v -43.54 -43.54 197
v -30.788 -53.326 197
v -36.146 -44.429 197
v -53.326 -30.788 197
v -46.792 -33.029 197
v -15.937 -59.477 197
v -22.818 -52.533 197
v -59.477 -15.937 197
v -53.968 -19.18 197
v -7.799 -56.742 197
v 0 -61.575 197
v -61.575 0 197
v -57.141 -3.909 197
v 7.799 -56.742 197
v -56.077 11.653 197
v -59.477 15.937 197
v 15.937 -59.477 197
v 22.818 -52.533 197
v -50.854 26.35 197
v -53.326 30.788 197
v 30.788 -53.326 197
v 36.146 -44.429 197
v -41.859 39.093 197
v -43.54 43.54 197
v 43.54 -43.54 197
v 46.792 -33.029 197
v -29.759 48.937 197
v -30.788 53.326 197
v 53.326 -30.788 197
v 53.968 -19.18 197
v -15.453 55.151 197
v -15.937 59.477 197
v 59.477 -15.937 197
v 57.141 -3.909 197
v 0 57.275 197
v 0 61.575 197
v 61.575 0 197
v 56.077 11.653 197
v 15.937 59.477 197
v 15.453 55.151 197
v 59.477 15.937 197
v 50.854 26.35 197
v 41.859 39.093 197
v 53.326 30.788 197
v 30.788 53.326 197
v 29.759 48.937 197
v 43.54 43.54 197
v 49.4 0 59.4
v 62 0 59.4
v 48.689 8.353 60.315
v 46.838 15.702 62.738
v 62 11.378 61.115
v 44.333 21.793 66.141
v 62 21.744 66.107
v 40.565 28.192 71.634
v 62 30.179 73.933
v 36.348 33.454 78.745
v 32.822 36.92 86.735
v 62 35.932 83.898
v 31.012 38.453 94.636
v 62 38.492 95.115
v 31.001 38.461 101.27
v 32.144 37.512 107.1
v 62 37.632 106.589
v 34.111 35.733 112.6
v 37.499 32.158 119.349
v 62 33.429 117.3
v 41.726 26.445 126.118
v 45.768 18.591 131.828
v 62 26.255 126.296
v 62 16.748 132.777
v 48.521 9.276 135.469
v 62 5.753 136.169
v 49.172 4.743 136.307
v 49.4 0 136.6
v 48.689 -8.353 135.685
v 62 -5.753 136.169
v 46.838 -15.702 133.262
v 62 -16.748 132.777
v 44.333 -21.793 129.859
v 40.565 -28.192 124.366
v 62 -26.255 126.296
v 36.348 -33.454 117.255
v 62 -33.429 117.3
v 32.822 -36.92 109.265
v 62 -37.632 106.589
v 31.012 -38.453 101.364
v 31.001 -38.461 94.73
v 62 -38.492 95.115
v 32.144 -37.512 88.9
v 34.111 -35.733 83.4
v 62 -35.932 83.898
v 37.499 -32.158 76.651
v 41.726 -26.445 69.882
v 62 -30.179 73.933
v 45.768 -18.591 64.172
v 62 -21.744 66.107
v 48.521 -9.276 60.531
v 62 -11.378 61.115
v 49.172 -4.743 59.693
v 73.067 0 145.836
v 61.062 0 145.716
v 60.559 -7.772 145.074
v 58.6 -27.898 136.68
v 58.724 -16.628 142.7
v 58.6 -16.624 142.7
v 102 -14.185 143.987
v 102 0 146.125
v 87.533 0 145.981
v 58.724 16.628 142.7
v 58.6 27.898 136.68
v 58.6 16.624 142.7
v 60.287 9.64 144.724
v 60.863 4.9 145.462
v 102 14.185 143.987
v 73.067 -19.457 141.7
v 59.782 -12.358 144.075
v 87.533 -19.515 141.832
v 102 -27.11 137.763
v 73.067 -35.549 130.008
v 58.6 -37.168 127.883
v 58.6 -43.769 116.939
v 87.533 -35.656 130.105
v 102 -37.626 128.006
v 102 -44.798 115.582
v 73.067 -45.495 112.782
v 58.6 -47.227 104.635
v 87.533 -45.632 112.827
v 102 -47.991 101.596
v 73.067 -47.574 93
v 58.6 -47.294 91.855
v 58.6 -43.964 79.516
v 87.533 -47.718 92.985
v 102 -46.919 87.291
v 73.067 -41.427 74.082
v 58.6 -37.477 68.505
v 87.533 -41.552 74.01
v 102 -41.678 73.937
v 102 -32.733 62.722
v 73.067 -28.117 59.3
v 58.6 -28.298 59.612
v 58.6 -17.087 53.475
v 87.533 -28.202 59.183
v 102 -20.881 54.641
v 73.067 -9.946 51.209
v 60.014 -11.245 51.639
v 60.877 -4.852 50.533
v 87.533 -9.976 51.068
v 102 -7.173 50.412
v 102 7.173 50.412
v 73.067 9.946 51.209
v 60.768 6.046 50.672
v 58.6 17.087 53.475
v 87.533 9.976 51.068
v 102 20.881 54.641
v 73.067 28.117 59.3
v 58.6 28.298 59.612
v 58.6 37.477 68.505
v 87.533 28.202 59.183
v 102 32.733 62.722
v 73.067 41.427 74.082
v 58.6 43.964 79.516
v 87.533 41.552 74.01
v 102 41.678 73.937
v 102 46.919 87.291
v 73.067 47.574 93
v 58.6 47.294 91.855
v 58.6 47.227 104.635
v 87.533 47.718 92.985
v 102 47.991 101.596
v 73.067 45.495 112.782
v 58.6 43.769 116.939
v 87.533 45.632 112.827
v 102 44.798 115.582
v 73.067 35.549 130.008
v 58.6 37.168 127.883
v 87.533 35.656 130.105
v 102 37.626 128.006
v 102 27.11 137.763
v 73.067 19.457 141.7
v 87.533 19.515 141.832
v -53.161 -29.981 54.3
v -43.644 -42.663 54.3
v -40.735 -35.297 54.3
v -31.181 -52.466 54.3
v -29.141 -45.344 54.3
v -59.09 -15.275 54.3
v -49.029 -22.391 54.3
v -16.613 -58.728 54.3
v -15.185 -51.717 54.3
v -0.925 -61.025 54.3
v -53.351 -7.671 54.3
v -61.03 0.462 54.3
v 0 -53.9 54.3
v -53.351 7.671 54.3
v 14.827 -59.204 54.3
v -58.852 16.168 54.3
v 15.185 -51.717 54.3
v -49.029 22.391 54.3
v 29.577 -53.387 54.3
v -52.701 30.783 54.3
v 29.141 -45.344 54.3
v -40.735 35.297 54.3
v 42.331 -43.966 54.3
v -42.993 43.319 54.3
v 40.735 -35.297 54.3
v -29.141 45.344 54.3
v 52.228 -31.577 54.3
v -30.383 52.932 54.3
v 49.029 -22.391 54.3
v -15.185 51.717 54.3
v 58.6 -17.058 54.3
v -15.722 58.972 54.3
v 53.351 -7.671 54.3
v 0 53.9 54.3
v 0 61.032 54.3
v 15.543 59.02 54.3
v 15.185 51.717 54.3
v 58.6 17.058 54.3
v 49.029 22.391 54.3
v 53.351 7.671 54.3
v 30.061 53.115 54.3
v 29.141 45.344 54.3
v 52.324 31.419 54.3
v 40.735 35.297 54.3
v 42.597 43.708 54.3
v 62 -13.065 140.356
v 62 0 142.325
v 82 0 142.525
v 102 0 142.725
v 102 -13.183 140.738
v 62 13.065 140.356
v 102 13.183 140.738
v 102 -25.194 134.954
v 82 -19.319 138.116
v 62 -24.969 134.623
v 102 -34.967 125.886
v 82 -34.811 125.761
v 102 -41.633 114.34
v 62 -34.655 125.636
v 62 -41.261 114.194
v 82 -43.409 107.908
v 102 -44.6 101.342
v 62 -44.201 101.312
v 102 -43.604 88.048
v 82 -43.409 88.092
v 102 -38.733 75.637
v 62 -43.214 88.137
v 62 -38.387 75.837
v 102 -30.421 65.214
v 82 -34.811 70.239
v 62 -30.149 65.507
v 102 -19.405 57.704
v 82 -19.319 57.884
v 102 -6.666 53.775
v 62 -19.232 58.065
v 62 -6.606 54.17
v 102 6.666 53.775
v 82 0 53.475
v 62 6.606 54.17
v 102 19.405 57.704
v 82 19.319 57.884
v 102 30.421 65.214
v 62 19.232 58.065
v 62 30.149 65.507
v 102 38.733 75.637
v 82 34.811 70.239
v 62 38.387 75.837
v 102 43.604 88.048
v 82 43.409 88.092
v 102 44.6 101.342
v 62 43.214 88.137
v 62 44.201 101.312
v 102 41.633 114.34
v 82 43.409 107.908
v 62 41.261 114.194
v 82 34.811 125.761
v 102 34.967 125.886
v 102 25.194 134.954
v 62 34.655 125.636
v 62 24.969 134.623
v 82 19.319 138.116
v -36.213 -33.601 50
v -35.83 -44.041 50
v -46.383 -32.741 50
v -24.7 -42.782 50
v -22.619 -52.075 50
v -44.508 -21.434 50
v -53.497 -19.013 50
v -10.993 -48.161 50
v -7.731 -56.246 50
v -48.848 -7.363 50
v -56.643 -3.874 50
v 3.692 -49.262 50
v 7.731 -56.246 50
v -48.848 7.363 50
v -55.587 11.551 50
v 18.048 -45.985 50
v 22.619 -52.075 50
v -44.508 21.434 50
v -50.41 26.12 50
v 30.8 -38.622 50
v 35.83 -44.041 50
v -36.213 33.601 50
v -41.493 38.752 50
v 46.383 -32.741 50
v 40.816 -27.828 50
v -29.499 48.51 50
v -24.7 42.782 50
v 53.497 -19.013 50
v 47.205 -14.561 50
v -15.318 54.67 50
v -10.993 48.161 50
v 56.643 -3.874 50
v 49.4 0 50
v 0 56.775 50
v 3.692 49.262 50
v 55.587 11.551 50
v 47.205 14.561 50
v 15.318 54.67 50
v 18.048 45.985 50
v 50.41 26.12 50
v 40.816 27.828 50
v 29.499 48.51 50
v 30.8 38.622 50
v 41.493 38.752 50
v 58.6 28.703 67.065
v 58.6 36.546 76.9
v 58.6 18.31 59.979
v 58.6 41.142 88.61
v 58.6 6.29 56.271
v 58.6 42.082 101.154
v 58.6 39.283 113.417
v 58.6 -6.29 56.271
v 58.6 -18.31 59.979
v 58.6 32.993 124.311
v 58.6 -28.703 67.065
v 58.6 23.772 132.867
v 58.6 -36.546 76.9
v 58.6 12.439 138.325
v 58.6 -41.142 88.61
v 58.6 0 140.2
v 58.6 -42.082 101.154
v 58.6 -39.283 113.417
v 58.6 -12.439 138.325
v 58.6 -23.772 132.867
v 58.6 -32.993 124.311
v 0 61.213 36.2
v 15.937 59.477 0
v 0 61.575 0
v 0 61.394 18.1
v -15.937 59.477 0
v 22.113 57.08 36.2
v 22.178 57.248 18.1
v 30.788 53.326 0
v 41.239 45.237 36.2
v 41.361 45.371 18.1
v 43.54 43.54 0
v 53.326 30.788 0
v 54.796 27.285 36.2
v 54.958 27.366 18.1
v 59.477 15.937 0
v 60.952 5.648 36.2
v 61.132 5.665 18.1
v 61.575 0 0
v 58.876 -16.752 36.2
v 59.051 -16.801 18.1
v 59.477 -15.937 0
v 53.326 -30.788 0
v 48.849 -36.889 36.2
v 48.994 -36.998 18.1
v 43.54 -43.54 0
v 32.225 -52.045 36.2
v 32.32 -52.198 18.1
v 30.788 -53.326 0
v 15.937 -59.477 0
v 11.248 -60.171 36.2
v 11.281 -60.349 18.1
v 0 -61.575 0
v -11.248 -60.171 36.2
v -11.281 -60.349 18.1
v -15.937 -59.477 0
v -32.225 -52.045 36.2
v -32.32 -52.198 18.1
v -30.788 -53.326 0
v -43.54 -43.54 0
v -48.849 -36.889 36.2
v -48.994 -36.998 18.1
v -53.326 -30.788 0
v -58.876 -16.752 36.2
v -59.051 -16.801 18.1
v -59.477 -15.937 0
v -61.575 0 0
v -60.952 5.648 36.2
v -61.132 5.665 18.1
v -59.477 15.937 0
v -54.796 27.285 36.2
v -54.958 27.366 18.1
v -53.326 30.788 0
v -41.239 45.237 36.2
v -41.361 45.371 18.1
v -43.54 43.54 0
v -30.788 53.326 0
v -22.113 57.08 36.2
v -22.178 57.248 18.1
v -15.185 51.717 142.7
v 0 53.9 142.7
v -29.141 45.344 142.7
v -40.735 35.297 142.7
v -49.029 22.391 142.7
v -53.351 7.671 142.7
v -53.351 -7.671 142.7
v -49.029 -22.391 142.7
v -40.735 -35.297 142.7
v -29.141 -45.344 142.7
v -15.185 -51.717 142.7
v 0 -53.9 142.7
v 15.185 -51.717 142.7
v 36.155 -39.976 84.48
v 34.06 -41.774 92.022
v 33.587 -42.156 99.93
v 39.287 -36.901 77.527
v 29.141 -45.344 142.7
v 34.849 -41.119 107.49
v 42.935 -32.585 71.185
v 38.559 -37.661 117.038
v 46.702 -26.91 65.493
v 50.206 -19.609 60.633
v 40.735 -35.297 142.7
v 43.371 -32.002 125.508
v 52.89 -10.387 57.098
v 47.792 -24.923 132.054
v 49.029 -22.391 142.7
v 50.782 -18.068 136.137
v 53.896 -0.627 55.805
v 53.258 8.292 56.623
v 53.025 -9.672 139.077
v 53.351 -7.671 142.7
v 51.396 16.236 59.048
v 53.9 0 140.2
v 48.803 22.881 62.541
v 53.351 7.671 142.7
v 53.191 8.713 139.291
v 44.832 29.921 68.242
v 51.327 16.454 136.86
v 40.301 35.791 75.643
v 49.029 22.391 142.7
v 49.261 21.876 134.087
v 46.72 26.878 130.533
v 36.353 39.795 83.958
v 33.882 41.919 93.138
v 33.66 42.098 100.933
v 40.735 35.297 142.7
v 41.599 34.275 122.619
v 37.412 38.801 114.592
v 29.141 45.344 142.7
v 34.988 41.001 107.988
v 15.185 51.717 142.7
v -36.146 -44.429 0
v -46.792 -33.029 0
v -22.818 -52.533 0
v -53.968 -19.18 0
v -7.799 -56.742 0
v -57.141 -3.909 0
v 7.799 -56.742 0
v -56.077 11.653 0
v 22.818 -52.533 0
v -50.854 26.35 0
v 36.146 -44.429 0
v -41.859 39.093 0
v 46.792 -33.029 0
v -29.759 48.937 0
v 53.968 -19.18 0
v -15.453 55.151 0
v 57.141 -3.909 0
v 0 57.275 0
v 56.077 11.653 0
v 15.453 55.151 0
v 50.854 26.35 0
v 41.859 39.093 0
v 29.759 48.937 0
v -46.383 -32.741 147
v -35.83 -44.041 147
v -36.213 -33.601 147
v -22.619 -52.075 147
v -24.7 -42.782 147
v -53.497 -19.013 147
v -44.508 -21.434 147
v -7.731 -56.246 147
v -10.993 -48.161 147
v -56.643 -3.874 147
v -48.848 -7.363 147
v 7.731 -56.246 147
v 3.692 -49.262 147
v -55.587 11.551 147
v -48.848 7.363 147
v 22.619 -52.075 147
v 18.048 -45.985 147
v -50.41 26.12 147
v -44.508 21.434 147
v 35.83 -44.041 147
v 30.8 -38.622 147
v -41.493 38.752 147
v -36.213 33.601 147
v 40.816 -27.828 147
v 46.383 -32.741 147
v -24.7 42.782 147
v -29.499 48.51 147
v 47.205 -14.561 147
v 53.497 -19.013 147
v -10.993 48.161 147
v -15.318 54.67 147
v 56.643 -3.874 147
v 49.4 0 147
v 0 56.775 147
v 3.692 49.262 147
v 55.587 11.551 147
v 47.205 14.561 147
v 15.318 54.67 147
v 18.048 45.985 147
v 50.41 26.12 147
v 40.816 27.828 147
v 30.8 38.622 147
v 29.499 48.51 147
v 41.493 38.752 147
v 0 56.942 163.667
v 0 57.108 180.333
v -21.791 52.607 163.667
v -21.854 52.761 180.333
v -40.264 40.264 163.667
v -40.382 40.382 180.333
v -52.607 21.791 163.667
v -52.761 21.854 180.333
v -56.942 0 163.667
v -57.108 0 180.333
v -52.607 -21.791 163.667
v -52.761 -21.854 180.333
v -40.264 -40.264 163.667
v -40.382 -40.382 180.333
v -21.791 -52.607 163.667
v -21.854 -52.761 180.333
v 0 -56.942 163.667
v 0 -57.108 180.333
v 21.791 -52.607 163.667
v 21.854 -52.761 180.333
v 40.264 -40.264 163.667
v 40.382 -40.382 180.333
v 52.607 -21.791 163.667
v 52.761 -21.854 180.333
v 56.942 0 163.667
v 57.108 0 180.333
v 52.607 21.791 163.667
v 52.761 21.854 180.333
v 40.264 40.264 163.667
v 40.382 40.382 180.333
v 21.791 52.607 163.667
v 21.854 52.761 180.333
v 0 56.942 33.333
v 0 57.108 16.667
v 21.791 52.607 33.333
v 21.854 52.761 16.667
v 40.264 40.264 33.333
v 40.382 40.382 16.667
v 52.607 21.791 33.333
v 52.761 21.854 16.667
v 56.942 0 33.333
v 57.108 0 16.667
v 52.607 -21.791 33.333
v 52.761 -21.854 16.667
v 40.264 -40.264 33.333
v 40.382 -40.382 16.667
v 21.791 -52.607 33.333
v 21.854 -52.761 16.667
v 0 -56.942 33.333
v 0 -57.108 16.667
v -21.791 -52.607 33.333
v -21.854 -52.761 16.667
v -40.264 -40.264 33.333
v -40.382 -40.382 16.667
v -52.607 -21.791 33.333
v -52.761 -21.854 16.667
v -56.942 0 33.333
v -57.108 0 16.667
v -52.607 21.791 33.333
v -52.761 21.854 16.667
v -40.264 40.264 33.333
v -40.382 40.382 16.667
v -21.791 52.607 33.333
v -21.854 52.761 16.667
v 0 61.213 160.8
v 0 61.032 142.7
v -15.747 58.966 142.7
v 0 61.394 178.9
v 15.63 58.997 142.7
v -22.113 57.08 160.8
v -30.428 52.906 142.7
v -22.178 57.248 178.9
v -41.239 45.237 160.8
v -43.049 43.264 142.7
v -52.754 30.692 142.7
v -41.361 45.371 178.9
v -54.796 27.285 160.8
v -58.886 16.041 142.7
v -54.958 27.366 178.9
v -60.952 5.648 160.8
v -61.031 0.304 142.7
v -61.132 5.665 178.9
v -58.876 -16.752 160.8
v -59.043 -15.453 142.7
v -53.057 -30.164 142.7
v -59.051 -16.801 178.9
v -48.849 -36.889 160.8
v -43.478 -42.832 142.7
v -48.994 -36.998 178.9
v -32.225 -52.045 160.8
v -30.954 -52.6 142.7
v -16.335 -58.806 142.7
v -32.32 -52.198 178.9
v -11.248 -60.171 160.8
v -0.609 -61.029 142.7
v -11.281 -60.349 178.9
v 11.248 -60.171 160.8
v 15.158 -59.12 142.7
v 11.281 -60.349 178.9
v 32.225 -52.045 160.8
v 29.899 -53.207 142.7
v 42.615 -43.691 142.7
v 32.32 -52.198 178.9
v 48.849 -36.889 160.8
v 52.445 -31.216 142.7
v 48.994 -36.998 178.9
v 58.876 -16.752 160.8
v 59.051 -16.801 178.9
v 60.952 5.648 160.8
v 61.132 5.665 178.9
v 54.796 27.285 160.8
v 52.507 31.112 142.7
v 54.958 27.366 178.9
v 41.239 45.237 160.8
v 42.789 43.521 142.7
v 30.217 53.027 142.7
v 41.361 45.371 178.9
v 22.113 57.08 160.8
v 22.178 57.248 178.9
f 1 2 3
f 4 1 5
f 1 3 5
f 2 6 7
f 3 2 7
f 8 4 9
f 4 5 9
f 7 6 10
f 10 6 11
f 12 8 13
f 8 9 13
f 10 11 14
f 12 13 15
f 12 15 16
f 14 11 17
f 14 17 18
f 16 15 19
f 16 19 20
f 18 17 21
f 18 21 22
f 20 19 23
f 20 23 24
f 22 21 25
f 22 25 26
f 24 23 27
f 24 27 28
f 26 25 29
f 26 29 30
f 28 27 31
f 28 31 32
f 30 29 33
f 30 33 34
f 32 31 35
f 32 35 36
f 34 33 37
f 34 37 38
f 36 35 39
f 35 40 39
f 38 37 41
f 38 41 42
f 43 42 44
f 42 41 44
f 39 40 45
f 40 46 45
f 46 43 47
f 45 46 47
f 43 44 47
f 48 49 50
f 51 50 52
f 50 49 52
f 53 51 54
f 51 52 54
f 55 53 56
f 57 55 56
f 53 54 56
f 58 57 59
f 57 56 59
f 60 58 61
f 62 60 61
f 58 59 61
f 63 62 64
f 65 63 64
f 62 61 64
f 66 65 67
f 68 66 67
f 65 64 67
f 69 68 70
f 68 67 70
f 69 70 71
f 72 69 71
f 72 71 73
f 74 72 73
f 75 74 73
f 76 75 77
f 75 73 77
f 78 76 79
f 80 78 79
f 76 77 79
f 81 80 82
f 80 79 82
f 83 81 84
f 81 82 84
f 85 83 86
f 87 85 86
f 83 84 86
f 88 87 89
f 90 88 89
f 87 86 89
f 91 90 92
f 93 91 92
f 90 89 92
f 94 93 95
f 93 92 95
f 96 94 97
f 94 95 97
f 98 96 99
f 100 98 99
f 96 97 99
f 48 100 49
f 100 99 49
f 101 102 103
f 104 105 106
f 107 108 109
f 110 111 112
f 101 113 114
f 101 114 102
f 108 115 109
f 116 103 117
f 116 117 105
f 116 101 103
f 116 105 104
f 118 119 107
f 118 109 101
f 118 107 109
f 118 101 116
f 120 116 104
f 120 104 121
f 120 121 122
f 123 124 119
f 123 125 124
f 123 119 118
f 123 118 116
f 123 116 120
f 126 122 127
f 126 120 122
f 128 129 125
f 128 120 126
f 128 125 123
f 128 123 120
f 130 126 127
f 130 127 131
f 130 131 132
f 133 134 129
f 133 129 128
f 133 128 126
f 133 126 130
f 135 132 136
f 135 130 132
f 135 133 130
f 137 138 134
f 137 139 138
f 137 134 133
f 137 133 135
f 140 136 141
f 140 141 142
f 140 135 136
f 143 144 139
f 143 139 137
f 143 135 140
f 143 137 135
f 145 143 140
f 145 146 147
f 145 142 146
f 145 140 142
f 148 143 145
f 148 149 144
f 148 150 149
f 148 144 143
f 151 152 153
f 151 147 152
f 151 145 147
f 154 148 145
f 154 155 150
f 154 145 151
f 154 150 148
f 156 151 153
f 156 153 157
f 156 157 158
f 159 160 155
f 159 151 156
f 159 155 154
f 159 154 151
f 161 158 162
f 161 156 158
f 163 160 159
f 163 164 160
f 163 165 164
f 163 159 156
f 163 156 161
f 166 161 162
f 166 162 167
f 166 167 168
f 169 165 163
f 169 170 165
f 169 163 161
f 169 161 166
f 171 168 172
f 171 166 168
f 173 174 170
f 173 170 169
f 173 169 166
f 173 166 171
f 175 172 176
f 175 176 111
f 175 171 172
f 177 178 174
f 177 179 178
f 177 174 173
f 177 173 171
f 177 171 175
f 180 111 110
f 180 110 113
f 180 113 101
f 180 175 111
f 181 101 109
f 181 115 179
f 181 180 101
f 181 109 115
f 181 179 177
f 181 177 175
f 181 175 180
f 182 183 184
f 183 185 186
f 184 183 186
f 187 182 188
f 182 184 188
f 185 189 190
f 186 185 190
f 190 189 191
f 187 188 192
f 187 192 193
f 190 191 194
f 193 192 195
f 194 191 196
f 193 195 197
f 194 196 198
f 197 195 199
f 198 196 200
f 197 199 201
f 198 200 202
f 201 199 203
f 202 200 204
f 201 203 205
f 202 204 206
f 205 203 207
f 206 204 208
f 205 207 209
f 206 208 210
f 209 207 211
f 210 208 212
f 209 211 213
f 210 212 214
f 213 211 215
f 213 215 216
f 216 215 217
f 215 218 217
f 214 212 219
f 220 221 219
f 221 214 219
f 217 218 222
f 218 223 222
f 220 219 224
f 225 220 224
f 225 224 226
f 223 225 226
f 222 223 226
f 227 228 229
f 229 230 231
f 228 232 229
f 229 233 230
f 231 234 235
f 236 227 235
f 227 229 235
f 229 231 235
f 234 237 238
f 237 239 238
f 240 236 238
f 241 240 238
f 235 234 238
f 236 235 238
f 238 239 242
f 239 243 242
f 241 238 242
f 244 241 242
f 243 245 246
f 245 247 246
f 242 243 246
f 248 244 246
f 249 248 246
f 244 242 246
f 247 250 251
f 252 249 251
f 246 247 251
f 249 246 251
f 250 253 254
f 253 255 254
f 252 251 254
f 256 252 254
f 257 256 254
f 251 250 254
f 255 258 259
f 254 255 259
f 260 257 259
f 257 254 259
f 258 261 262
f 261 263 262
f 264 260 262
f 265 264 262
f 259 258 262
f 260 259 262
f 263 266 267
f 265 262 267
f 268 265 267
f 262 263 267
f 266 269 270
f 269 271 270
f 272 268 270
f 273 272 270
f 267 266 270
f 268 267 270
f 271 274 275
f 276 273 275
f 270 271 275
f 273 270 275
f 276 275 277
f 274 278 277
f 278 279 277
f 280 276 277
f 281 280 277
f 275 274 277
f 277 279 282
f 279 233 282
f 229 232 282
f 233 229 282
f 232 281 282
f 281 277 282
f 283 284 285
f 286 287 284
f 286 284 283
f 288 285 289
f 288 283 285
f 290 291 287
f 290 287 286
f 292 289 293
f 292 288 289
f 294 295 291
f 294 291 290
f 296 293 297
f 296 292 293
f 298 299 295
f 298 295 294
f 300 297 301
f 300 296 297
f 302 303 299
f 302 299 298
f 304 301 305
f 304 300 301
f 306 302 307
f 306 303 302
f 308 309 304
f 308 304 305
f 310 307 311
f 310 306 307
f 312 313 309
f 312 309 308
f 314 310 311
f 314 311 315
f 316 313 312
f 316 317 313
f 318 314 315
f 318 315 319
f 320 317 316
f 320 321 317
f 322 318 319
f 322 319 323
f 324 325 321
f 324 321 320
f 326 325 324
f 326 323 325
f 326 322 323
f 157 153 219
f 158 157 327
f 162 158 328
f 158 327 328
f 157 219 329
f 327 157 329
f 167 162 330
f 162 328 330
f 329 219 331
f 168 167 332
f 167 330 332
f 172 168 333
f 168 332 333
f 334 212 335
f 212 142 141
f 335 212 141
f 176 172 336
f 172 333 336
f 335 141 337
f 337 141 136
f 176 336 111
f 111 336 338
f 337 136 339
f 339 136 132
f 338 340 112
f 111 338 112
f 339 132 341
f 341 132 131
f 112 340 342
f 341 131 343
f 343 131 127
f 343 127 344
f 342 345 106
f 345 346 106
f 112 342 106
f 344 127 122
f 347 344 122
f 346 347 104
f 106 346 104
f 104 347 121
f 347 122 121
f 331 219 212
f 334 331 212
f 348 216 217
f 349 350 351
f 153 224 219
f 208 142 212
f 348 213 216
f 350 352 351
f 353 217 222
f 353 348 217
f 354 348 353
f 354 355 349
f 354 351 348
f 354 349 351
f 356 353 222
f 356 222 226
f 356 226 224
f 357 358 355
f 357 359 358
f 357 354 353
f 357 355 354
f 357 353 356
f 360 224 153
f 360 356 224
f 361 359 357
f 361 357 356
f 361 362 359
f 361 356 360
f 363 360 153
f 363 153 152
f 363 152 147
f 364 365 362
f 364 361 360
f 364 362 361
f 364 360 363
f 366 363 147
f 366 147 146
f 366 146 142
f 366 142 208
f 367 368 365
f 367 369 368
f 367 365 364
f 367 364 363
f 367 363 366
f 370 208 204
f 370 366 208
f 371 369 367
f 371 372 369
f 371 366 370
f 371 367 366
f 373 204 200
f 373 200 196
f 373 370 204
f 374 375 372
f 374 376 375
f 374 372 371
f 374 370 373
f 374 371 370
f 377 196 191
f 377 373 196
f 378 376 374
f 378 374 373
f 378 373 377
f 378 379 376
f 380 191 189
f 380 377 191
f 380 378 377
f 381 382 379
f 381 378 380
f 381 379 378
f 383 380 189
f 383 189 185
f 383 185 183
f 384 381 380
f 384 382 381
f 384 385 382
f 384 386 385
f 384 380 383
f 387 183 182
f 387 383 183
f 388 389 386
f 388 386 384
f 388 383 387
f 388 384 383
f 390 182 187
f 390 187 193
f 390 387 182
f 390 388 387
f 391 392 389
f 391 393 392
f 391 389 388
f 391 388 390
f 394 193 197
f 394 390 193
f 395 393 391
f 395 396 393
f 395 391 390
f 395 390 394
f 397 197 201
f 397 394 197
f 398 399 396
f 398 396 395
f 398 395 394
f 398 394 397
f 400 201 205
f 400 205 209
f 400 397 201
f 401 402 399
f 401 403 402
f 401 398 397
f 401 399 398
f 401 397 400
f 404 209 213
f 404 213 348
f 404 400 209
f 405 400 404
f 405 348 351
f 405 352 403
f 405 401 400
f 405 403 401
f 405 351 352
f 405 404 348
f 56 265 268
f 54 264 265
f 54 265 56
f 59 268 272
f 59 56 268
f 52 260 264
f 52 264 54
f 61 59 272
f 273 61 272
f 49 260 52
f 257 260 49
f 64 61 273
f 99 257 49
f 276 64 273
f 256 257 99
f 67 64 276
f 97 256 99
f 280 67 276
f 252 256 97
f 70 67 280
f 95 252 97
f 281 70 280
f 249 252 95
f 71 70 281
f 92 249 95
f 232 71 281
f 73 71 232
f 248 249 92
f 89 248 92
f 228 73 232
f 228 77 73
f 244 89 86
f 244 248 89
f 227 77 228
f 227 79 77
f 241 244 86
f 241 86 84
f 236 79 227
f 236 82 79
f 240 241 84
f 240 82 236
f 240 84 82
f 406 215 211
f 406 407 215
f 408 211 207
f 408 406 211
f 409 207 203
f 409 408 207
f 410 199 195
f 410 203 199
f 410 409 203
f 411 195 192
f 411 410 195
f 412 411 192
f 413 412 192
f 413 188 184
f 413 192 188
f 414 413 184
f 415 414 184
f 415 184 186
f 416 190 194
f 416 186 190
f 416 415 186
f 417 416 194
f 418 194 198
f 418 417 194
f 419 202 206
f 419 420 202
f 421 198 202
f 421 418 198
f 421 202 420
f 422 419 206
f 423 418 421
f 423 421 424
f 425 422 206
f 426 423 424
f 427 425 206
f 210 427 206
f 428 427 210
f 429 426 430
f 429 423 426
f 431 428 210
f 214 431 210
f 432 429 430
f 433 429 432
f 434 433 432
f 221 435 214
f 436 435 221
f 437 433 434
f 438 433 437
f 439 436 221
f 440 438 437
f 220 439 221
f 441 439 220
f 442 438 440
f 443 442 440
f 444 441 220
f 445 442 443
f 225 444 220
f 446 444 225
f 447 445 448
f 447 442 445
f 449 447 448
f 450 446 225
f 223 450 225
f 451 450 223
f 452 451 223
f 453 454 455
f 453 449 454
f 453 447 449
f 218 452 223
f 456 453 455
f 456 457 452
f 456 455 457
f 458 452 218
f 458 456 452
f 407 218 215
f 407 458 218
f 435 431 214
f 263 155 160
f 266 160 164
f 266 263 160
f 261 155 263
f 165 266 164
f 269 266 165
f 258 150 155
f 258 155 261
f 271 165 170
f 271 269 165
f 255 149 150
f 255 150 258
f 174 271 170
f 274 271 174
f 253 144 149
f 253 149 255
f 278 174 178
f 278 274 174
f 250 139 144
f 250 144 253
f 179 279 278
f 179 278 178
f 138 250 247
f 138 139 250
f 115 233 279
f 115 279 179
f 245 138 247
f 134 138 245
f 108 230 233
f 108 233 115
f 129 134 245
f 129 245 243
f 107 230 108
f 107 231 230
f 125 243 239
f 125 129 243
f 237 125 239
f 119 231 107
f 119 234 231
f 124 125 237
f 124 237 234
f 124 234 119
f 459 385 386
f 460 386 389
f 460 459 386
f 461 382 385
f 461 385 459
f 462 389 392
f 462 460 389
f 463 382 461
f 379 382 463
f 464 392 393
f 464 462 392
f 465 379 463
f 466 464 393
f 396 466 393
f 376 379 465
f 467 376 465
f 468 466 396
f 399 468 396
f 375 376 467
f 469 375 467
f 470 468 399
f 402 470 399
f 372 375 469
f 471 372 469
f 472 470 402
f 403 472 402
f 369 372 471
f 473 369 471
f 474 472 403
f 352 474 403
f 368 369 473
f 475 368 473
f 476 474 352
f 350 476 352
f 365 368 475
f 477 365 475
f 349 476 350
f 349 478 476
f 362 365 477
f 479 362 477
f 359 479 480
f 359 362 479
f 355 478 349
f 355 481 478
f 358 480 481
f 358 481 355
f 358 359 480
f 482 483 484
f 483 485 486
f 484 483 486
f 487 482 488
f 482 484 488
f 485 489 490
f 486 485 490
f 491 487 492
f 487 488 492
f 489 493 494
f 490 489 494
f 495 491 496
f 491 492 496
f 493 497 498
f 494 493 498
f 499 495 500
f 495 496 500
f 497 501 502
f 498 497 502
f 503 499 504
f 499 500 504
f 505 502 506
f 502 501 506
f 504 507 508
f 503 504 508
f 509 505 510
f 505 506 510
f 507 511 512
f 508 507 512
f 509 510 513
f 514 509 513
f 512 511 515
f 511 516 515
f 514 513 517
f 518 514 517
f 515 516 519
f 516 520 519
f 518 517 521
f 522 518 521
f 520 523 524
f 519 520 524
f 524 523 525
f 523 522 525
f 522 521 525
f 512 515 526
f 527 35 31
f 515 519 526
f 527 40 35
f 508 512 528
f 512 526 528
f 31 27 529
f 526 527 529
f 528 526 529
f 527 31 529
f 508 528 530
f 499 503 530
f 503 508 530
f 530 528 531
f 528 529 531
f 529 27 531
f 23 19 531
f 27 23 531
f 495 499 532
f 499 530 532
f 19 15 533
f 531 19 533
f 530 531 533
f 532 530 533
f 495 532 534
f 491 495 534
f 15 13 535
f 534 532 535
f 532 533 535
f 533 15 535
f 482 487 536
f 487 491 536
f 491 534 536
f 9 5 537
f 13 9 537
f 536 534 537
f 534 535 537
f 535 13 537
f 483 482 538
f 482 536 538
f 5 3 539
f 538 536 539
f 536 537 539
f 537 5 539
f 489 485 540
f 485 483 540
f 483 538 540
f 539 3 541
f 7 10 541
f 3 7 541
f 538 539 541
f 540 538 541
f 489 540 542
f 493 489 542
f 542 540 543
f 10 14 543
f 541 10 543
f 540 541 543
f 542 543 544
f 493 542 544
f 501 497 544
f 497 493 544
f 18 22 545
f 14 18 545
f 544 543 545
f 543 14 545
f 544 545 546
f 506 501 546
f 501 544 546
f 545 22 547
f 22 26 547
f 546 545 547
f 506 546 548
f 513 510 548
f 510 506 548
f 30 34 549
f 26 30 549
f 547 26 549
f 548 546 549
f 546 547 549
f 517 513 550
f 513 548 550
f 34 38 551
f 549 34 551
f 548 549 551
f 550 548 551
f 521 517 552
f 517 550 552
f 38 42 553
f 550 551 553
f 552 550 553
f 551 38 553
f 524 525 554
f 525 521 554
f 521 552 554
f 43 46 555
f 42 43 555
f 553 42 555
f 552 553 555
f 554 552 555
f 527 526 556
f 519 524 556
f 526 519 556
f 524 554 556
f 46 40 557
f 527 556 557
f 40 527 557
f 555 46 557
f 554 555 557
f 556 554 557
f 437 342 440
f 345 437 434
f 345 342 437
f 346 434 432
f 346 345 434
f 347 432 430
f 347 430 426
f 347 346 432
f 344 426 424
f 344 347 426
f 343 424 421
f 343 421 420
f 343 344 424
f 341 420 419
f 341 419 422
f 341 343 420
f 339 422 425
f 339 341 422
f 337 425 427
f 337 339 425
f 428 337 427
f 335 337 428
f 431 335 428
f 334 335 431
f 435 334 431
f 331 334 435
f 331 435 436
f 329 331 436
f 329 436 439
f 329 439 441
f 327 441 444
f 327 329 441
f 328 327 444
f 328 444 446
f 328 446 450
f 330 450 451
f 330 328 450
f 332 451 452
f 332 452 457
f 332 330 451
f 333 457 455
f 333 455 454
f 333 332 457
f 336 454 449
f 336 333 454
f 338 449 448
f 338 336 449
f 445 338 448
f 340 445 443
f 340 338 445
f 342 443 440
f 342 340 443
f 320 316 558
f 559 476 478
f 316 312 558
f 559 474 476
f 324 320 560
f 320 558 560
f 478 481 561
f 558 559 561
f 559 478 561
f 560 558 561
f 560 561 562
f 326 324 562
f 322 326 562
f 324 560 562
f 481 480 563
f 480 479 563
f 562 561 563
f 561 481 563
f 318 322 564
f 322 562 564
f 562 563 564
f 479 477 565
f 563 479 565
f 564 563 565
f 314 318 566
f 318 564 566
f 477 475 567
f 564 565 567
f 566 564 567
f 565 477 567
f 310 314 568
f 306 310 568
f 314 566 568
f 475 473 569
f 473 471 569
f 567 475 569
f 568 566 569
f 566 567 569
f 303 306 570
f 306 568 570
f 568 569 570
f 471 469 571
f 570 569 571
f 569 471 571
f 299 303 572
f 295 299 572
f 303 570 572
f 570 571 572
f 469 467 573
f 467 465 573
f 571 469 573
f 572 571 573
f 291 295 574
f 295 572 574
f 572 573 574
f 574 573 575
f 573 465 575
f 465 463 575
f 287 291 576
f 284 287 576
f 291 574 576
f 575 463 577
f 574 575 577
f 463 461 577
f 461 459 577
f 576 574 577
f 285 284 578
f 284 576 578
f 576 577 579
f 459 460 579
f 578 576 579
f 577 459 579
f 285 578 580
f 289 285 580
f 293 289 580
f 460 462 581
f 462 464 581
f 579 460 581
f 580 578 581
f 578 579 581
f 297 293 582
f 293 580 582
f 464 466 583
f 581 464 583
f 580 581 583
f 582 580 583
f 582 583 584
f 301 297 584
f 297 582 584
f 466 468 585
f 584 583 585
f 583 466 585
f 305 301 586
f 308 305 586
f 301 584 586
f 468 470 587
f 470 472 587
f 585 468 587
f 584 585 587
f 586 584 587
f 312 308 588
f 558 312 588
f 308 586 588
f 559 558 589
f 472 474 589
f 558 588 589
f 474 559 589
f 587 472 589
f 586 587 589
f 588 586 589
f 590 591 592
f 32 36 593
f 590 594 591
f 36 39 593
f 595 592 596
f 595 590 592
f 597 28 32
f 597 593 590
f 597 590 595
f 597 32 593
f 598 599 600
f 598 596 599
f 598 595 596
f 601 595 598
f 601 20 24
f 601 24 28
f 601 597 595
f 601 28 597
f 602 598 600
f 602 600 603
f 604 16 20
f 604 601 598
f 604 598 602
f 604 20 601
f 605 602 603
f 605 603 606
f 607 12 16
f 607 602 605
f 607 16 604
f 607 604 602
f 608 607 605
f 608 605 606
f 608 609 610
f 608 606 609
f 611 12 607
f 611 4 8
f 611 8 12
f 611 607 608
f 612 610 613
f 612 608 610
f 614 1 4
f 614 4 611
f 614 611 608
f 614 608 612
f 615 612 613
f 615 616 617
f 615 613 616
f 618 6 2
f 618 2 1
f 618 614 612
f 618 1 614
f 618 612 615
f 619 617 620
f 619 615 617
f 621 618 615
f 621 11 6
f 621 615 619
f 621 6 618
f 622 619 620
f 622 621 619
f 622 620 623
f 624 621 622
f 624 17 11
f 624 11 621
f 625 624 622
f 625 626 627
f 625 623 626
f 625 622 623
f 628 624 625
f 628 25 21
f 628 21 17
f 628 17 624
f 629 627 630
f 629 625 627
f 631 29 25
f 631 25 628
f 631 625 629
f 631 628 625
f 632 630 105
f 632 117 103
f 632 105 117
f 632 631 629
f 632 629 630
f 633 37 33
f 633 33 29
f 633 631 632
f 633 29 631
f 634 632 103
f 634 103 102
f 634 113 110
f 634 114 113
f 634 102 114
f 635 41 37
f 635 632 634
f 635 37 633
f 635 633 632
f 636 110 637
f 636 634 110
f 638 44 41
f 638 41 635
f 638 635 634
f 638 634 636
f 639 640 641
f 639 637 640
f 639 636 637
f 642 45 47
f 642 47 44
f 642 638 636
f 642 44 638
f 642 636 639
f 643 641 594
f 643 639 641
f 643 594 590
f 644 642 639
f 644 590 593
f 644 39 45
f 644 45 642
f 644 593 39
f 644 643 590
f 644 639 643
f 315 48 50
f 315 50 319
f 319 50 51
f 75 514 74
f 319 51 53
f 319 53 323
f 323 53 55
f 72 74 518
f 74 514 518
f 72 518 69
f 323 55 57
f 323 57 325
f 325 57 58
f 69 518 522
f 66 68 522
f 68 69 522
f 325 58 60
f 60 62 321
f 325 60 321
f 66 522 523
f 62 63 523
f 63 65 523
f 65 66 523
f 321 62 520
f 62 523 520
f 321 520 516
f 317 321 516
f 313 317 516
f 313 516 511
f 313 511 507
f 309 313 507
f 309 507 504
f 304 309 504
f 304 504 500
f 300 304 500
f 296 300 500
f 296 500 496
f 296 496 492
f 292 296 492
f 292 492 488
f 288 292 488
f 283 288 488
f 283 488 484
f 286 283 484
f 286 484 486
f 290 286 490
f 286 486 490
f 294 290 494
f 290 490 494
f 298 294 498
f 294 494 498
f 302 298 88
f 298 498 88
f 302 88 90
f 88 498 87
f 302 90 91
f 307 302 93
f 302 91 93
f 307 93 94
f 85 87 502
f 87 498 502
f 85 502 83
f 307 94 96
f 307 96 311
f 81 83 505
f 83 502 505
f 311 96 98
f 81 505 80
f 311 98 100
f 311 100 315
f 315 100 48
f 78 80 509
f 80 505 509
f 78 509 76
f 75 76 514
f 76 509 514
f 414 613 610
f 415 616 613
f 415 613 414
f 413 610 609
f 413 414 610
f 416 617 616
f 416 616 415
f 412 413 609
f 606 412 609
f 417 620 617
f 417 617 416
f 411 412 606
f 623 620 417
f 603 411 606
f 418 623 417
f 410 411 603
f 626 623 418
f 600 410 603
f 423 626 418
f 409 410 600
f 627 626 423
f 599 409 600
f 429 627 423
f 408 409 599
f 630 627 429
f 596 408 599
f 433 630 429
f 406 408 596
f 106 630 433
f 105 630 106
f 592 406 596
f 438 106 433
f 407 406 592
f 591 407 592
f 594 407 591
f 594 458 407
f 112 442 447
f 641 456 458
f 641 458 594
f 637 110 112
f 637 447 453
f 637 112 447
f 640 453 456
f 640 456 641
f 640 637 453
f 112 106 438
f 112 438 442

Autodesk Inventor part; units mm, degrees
ref_plane "YZ Plane" through (0, 0, 0) normal (1, 0, 0) x (0, 1, 0)
ref_plane "XZ Plane" through (0, 0, 0) normal (0, 1, 0) x (-1, 0, 0)
ref_plane "XY Plane" through (0, 0, 0) normal (0, 0, 1) x (1, 0, 0)
sketch "Sketch1" plane through (0, 0, 0) normal (1, 0, 0) x (0, 1, 0)
  line L0 (0, 0) -> (61.5752, 0)
  line L1 (61.5752, 0) -> (61.0322, 54.3)
  line L2 (0, 197) -> (0, 0)
  line L3 (56.775, 50) -> (57.275, 0)
  line L4 (53.9, 54.3) -> (53.9, 142.7)
  line L5 (0, 54.3) -> (61.0322, 54.3)
  line L6 (56.775, 50) -> (0, 50)
  line L7 (0, 98.5) -> (53.9, 98.5) construction
  line L8 (0, 197) -> (61.5752, 197)
  line L9 (61.5752, 197) -> (61.0322, 142.7)
  line L10 (56.775, 147) -> (57.275, 197)
  line L11 (0, 142.7) -> (61.0322, 142.7)
  line L12 (56.775, 147) -> (0, 147)
  line L13 (0, 142.7) -> (0, 54.3)
  dimension "d0" = 114.55
  dimension "d3" = 113.55
  dimension "d4" = 107.8
  dimension "d5" = 4.3
  dimension "d8" = 50
  dimension "d9" = 4.3
  dimension "d25" = 197
revolve "Revolution1" add sketch "Sketch1" angle 360 about axis through (0, 0, 197) along (0, 0, -1) contours L3 L6 L2 L5 L1 L0 | L2 L11 L4 L5 | L2 L12 L10 L8 L9 L11
sketch "Sketch2" plane through (0, 0, 0) normal (0, 1, 0) x (-1, 0, 0)
  line L0 (-57.275, 0) -> (57.275, 0) projected
  line L1 (0, 197) -> (0, 0)
  line L2 (0, 98) -> (-102, 98)
  line L3 (-102, 98) -> (-102, 146.1252)
  line L4 (-102, 146.1252) -> (-58.6, 145.6912)
  line L5 (-58.6, 145.6912) -> (-58.6, 98)
  line L6 (-62, 145.7252) -> (-62, 98)
  line L7 (0, 140.2) -> (-58.6, 140.2)
  line L8 (-62, 142.325) -> (-102, 142.725)
  line L9 (-57.275, 197) -> (57.275, 197) projected
  dimension "d10" = 98
  dimension "d13" = 102
  dimension "d14" = 89.45
  dimension "d15" = 88.65
  dimension "d16" = 84.4
  dimension "d17" = 40
  dimension "d18" = 3.4
  dimension "d19" = 3.4
revolve "Revolution2" add sketch "Sketch2" angle 360 about axis through (0, 0, 98) along (1, 0, 0) contours L1 L2 L5 L7 | L5 L2 L6 L4 | L6 L8 L3 L4
sketch "Sketch3" plane through (0, 0, 147) normal (0, 0, 1) x (1, 0, 0)
  circle A0 centre (0, 0) radius 56.775 projected
  circle A1 centre (0, 0) radius 49.4
  dimension "d26" = 98.8
extrude "Extrusion1" cut sketch "Sketch3" against normal through all contours A1
sketch "Sketch4" plane through (62, 0, 98) normal (1, 0, 0) x (0, 0, -1)
  circle A0 centre (0, 0) radius 38.6
  circle A1 centre (0, 0) radius 44.325 projected
  dimension "d23" = 77.2
extrude "Extrusion2" cut sketch "Sketch4" against normal up to surface contours A0
equation "\"d26\" = d1"
equation "\"d23\" = d2"
equation "\"d0\" = d11"
equation "\"d3\" = d21"
equation "\"d4\" = d1 + 2 * t11"
equation "\"d5\" = t21"
equation "\"d8\" = l11"
equation "\"d9\" = t21"
equation "\"d25\" = L1 + L2"
equation "\"d10\" = L1"
equation "\"d13\" = L3"
equation "\"d14\" = d12"
equation "\"d15\" = d22"
equation "\"d16\" = d2 + 2 * t12"
equation "\"d17\" = l12"
equation "\"d18\" = t22"
equation "\"d19\" = t22"
equation "\"d1\" = 98.8"
equation "\"d11\" = 114.55"
equation "\"d21\" = 113.55"
equation "\"l11\" = 50"
equation "\"L1\" = 98"
equation "\"L2\" = 99"
equation "\"L3\" = 102"
equation "\"t11\" = 4.5"
equation "\"t21\" = 4.3"
equation "\"Z1\" = 48"
equation "\"Z2\" = 49"
equation "\"Z3\" = 62"
equation "\"d2\" = 77.2"
equation "\"d12\" = 89.45"
equation "\"d22\" = 88.65"
equation "\"l12\" = 40"
equation "\"t12\" = 3.6"
equation "\"t22\" = 3.4"
equation "\"d7\" = t21"
equation "\"Size_Designation\" = 1.2345"
properties part number "JIS K 6739 90 Deg Lateral Reducer (DT) 100 x 100 x 75" material "PVC, Unplasticized"
